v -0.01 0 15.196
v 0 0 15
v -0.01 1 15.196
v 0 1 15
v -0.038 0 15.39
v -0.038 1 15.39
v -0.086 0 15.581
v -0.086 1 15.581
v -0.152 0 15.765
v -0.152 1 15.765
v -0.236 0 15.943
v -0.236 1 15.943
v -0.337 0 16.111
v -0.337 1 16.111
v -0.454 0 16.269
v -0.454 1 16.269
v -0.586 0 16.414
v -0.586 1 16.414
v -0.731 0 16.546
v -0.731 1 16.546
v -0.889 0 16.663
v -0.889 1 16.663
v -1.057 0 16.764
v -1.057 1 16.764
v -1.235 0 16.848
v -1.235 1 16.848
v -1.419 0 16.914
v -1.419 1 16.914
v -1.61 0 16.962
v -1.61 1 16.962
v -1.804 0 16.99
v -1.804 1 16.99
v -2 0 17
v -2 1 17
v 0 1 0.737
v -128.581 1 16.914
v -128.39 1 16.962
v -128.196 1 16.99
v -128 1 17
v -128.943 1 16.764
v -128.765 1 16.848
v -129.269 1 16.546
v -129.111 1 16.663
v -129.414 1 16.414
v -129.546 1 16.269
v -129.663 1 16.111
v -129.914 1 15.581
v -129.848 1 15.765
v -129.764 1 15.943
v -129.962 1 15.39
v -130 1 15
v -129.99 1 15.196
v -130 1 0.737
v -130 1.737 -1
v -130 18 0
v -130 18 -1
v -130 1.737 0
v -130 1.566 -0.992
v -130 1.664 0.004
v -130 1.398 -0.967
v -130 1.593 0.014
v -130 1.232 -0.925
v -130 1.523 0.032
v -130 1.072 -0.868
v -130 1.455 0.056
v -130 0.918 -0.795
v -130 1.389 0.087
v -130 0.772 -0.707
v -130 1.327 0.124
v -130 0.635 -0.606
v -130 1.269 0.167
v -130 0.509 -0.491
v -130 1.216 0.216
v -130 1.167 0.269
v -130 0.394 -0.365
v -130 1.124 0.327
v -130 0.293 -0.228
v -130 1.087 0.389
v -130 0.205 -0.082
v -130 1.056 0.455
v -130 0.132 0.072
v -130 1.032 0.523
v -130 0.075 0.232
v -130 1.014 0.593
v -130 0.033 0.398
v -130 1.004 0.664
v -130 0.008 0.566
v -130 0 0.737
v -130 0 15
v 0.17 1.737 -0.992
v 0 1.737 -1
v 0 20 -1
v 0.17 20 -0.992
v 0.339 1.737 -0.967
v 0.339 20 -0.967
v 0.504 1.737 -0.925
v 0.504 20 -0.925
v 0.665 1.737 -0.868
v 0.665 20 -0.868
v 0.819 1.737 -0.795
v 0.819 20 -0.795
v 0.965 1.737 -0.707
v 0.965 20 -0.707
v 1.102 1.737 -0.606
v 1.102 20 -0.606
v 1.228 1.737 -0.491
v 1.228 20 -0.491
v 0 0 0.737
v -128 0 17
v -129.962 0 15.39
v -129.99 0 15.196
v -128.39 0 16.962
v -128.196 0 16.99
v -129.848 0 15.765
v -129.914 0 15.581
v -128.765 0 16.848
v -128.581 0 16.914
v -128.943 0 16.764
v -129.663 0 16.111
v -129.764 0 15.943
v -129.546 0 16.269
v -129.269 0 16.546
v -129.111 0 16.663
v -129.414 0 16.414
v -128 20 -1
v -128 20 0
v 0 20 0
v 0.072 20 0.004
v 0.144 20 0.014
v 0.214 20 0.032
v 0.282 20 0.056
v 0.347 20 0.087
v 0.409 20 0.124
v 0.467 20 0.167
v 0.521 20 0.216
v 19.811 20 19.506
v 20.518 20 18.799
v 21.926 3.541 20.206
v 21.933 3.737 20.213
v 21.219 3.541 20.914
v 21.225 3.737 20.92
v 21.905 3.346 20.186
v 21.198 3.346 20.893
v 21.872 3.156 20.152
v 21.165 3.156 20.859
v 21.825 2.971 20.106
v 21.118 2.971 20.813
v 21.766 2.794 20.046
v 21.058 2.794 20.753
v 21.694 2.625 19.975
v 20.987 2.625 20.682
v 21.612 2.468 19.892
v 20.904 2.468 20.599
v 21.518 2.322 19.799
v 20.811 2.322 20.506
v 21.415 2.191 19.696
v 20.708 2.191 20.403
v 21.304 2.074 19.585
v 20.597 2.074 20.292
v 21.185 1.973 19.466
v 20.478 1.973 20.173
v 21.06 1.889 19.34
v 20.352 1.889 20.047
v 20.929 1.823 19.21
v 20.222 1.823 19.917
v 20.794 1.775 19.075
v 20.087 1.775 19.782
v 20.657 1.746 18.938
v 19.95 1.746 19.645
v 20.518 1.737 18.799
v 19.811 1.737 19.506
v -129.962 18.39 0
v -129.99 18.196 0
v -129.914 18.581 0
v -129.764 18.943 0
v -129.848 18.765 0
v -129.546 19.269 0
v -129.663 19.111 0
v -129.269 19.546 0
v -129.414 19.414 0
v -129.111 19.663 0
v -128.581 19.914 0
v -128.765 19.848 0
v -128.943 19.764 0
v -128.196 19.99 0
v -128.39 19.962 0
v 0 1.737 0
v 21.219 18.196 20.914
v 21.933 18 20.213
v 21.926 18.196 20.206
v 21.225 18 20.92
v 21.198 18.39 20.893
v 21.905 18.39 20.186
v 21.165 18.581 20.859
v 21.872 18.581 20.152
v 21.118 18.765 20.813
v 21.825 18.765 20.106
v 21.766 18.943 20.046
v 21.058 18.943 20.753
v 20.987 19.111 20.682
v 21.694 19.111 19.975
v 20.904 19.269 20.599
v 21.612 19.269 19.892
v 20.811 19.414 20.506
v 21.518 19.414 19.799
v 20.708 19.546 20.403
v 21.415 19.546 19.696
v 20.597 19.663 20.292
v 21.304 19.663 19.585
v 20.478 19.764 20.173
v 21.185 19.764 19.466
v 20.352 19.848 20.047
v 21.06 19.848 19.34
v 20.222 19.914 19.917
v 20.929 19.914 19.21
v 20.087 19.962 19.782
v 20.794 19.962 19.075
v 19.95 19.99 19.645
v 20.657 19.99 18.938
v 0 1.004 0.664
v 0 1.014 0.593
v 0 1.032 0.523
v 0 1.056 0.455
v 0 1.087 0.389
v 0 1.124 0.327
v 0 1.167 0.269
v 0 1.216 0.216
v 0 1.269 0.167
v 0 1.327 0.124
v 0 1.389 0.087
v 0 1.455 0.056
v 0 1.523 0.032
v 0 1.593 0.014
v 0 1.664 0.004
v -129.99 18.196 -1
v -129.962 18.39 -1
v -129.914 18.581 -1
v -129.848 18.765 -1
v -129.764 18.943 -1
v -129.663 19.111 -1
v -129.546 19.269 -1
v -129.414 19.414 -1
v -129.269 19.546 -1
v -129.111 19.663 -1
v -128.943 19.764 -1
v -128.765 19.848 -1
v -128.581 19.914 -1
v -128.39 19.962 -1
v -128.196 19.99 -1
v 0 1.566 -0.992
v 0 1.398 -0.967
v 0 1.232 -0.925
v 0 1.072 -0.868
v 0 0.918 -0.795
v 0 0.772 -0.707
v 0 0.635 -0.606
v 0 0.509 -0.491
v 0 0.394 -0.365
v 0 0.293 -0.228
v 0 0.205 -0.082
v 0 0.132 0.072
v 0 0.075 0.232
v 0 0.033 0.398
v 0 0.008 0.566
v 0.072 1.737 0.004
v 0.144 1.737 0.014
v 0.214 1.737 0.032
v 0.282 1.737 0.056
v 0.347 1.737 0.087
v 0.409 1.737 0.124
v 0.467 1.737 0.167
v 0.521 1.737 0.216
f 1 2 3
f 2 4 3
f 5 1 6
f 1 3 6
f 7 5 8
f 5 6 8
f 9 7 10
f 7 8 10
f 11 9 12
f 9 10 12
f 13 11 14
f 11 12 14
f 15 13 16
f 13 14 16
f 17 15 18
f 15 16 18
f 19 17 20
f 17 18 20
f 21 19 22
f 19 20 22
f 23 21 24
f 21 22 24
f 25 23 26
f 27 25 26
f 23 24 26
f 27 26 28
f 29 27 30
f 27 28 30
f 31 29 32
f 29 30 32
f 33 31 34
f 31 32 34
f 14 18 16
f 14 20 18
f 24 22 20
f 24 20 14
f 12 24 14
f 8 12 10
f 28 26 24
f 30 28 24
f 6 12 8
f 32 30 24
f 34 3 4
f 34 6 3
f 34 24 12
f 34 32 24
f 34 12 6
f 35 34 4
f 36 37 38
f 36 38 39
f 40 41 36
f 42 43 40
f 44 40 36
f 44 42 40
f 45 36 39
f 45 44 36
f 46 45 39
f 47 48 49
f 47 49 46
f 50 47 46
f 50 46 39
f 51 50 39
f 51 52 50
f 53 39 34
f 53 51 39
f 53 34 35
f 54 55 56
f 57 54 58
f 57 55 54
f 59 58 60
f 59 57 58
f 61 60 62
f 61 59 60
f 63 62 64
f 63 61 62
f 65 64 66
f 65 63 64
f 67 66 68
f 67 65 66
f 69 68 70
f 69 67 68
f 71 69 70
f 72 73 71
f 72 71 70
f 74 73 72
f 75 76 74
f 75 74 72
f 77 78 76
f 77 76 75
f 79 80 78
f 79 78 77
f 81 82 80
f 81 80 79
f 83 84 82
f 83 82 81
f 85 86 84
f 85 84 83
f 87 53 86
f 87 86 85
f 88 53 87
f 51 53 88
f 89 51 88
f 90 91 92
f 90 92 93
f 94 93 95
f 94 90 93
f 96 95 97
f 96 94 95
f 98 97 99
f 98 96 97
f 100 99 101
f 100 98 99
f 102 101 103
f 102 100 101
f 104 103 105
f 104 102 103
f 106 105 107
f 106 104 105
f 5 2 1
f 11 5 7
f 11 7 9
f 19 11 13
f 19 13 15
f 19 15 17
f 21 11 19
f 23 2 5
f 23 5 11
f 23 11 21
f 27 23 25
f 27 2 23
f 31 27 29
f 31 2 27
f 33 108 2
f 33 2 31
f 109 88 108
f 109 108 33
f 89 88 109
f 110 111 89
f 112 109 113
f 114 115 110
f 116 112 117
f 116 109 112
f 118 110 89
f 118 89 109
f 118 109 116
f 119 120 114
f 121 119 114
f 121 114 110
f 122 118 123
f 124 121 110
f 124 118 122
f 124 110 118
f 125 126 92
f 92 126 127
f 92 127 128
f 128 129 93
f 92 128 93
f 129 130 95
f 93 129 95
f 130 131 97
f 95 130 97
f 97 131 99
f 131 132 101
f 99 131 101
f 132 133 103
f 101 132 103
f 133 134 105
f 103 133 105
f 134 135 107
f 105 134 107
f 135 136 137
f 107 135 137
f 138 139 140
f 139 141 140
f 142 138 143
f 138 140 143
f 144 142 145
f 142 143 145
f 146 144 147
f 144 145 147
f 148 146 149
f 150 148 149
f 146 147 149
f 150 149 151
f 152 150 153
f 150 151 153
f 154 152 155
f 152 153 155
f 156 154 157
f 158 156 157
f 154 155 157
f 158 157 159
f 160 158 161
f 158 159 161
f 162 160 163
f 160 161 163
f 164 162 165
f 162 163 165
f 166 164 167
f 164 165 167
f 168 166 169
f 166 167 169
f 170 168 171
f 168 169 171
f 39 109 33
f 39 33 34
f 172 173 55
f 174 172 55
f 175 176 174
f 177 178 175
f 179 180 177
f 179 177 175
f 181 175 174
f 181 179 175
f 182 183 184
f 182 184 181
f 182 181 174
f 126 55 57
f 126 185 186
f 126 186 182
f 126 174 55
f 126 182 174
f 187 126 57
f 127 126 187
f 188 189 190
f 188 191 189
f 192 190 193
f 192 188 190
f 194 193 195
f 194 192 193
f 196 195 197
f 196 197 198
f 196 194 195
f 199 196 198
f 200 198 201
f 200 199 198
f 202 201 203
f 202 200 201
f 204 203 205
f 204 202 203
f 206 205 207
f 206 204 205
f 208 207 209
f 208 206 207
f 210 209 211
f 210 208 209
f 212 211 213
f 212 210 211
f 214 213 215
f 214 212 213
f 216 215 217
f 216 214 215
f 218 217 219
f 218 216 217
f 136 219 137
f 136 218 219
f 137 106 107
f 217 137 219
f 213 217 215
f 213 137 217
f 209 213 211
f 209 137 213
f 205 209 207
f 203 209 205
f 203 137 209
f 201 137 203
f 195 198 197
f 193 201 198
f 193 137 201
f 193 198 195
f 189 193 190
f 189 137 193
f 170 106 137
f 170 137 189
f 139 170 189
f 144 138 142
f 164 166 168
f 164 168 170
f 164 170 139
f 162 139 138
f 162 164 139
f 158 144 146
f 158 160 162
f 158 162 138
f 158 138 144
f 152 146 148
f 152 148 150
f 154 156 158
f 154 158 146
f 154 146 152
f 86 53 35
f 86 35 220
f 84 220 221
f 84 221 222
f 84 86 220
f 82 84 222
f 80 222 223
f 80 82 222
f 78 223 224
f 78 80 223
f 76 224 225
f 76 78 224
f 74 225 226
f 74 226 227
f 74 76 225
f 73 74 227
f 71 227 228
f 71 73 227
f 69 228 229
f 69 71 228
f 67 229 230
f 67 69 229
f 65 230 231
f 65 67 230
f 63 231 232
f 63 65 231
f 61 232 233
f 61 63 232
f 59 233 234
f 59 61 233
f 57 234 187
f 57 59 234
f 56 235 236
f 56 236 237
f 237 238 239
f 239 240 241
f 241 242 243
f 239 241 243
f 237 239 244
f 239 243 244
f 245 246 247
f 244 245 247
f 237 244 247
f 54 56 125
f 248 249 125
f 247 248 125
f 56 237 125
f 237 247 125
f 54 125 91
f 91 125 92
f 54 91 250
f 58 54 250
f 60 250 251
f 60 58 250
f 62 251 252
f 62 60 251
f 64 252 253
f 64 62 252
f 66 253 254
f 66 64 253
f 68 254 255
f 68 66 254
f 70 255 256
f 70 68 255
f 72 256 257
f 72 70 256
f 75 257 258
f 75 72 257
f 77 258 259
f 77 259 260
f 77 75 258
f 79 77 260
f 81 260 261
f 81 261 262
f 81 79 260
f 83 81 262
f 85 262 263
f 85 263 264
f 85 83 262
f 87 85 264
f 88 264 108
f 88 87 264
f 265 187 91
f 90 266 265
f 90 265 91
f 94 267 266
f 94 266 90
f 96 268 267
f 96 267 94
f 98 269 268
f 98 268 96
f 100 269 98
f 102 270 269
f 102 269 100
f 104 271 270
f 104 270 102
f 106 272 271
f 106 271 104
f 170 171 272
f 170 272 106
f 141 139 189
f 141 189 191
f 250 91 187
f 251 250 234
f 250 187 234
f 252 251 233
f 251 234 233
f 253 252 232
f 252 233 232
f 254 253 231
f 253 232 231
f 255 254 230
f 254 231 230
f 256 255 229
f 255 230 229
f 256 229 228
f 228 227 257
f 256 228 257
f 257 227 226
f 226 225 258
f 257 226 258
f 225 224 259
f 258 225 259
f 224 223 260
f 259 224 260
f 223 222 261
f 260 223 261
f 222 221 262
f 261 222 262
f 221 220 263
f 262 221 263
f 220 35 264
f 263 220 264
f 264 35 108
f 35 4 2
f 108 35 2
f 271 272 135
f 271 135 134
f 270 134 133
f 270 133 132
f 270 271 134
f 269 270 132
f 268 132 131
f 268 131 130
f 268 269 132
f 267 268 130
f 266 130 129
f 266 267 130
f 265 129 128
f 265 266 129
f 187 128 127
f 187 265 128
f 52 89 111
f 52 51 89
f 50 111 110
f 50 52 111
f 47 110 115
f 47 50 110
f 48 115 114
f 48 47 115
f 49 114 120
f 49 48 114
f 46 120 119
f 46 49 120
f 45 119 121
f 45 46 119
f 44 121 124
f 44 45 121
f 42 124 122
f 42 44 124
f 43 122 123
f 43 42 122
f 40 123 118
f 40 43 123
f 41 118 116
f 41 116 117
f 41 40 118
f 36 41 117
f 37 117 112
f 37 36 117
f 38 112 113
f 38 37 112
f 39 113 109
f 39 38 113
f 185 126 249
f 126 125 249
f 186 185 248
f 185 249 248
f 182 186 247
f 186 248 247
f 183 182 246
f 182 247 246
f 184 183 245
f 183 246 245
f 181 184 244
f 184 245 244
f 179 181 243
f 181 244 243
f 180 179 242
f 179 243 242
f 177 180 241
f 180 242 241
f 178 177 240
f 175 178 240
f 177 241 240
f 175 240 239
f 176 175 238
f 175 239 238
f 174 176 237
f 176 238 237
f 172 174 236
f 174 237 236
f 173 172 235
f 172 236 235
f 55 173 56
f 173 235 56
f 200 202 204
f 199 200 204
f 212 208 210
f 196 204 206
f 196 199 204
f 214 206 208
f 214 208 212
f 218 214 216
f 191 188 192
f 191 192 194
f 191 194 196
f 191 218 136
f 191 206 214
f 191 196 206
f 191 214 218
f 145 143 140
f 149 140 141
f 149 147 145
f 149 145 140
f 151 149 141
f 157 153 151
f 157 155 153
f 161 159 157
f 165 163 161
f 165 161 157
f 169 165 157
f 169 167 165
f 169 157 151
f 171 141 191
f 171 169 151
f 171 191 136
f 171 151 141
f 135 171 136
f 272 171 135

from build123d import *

# Parameters (mm, degrees)
SKETCH2_W                    = 130
SKETCH2_H                    = 20
BASE_FLANGE1_DEPTH           = 1
EDGE_FLANGE1_STRIP_W         = 5.4732
EDGE_FLANGE1_STRIP_H         = 1
EDGE_FLANGE1_STRIP_CUT_DEPTH = 130
EDGE_FLANGE1_DEPTH           = 130
EDGE_FLANGE2_DEPTH           = 18.2634
FILLET1_R                    = 2


# Sheet-metal steps are written as plain solids
with BuildPart() as part:
    # Sketch2 → Base-Flange1 (new body)
    with BuildSketch(Plane.XY):
        with Locations((-65, 10)):
            Rectangle(SKETCH2_W, SKETCH2_H)
    extrude(amount=-BASE_FLANGE1_DEPTH)

    # Edge-Flange1 strip (across the edge) → Edge-Flange1 strip cut (cut)
    with BuildSketch(Plane.YZ.offset(-130)):
        with Locations((-1, -0.5)):
            Rectangle(EDGE_FLANGE1_STRIP_W, EDGE_FLANGE1_STRIP_H)
    extrude(amount=EDGE_FLANGE1_STRIP_CUT_DEPTH, mode=Mode.SUBTRACT)

    # Edge-Flange1 section (across the edge) → Edge-Flange1 (add)
    with BuildSketch(Plane.YZ.offset(-130)):
        with BuildLine():
            Line((0, 0.7366), (0, 17))
            Line((0, 17), (1, 17))
            Line((1, 17), (1, 0.7366))
            ThreePointArc((1, 0.7366), (1.215745145, 0.215745145), (1.7366, 0))
            Line((1.7366, 0), (1.7366, -1))
            ThreePointArc((1.7366, -1), (0.508638364, -0.491361636), (0, 0.7366))
        make_face()
    extrude(amount=EDGE_FLANGE1_DEPTH)

    # Edge-Flange2 section (across the edge) → Edge-Flange2 (add)
    with BuildSketch(Plane(origin=(0.30510971, 1.7366, 0), x_dir=(-0.7071067811865438, 0, 0.7071067811865512), z_dir=(0, 1, 0))):
        with BuildLine():
            Line((-1, 0.30510971), (-1, 29.585786438))
            Line((-1, 29.585786438), (0, 29.585786438))
            Line((0, 29.585786438), (0, 0.30510971))
            ThreePointArc((0, 0.30510971), (0.056070336, 0.023225094), (0.215745145, -0.215745145))
            Line((0.215745145, -0.215745145), (-0.491361636, -0.922851926))
            ThreePointArc((-0.491361636, -0.922851926), (-0.867809196, -0.359458339), (-1, 0.30510971))
        make_face()
    extrude(amount=EDGE_FLANGE2_DEPTH)

    # Fillet1
    fillet1_edges = [part.edges().sort_by_distance(p)[0] for p in [
        (-130, 0.5, 17),
        (0, 0.5, 17),
        (21.578973317, 1.7366, 20.566756826),
        (21.578973317, 20, 20.566756826),
        (-130, 20, -0.5),
    ]]
    fillet(fillet1_edges, radius=FILLET1_R)


solid = part.part
